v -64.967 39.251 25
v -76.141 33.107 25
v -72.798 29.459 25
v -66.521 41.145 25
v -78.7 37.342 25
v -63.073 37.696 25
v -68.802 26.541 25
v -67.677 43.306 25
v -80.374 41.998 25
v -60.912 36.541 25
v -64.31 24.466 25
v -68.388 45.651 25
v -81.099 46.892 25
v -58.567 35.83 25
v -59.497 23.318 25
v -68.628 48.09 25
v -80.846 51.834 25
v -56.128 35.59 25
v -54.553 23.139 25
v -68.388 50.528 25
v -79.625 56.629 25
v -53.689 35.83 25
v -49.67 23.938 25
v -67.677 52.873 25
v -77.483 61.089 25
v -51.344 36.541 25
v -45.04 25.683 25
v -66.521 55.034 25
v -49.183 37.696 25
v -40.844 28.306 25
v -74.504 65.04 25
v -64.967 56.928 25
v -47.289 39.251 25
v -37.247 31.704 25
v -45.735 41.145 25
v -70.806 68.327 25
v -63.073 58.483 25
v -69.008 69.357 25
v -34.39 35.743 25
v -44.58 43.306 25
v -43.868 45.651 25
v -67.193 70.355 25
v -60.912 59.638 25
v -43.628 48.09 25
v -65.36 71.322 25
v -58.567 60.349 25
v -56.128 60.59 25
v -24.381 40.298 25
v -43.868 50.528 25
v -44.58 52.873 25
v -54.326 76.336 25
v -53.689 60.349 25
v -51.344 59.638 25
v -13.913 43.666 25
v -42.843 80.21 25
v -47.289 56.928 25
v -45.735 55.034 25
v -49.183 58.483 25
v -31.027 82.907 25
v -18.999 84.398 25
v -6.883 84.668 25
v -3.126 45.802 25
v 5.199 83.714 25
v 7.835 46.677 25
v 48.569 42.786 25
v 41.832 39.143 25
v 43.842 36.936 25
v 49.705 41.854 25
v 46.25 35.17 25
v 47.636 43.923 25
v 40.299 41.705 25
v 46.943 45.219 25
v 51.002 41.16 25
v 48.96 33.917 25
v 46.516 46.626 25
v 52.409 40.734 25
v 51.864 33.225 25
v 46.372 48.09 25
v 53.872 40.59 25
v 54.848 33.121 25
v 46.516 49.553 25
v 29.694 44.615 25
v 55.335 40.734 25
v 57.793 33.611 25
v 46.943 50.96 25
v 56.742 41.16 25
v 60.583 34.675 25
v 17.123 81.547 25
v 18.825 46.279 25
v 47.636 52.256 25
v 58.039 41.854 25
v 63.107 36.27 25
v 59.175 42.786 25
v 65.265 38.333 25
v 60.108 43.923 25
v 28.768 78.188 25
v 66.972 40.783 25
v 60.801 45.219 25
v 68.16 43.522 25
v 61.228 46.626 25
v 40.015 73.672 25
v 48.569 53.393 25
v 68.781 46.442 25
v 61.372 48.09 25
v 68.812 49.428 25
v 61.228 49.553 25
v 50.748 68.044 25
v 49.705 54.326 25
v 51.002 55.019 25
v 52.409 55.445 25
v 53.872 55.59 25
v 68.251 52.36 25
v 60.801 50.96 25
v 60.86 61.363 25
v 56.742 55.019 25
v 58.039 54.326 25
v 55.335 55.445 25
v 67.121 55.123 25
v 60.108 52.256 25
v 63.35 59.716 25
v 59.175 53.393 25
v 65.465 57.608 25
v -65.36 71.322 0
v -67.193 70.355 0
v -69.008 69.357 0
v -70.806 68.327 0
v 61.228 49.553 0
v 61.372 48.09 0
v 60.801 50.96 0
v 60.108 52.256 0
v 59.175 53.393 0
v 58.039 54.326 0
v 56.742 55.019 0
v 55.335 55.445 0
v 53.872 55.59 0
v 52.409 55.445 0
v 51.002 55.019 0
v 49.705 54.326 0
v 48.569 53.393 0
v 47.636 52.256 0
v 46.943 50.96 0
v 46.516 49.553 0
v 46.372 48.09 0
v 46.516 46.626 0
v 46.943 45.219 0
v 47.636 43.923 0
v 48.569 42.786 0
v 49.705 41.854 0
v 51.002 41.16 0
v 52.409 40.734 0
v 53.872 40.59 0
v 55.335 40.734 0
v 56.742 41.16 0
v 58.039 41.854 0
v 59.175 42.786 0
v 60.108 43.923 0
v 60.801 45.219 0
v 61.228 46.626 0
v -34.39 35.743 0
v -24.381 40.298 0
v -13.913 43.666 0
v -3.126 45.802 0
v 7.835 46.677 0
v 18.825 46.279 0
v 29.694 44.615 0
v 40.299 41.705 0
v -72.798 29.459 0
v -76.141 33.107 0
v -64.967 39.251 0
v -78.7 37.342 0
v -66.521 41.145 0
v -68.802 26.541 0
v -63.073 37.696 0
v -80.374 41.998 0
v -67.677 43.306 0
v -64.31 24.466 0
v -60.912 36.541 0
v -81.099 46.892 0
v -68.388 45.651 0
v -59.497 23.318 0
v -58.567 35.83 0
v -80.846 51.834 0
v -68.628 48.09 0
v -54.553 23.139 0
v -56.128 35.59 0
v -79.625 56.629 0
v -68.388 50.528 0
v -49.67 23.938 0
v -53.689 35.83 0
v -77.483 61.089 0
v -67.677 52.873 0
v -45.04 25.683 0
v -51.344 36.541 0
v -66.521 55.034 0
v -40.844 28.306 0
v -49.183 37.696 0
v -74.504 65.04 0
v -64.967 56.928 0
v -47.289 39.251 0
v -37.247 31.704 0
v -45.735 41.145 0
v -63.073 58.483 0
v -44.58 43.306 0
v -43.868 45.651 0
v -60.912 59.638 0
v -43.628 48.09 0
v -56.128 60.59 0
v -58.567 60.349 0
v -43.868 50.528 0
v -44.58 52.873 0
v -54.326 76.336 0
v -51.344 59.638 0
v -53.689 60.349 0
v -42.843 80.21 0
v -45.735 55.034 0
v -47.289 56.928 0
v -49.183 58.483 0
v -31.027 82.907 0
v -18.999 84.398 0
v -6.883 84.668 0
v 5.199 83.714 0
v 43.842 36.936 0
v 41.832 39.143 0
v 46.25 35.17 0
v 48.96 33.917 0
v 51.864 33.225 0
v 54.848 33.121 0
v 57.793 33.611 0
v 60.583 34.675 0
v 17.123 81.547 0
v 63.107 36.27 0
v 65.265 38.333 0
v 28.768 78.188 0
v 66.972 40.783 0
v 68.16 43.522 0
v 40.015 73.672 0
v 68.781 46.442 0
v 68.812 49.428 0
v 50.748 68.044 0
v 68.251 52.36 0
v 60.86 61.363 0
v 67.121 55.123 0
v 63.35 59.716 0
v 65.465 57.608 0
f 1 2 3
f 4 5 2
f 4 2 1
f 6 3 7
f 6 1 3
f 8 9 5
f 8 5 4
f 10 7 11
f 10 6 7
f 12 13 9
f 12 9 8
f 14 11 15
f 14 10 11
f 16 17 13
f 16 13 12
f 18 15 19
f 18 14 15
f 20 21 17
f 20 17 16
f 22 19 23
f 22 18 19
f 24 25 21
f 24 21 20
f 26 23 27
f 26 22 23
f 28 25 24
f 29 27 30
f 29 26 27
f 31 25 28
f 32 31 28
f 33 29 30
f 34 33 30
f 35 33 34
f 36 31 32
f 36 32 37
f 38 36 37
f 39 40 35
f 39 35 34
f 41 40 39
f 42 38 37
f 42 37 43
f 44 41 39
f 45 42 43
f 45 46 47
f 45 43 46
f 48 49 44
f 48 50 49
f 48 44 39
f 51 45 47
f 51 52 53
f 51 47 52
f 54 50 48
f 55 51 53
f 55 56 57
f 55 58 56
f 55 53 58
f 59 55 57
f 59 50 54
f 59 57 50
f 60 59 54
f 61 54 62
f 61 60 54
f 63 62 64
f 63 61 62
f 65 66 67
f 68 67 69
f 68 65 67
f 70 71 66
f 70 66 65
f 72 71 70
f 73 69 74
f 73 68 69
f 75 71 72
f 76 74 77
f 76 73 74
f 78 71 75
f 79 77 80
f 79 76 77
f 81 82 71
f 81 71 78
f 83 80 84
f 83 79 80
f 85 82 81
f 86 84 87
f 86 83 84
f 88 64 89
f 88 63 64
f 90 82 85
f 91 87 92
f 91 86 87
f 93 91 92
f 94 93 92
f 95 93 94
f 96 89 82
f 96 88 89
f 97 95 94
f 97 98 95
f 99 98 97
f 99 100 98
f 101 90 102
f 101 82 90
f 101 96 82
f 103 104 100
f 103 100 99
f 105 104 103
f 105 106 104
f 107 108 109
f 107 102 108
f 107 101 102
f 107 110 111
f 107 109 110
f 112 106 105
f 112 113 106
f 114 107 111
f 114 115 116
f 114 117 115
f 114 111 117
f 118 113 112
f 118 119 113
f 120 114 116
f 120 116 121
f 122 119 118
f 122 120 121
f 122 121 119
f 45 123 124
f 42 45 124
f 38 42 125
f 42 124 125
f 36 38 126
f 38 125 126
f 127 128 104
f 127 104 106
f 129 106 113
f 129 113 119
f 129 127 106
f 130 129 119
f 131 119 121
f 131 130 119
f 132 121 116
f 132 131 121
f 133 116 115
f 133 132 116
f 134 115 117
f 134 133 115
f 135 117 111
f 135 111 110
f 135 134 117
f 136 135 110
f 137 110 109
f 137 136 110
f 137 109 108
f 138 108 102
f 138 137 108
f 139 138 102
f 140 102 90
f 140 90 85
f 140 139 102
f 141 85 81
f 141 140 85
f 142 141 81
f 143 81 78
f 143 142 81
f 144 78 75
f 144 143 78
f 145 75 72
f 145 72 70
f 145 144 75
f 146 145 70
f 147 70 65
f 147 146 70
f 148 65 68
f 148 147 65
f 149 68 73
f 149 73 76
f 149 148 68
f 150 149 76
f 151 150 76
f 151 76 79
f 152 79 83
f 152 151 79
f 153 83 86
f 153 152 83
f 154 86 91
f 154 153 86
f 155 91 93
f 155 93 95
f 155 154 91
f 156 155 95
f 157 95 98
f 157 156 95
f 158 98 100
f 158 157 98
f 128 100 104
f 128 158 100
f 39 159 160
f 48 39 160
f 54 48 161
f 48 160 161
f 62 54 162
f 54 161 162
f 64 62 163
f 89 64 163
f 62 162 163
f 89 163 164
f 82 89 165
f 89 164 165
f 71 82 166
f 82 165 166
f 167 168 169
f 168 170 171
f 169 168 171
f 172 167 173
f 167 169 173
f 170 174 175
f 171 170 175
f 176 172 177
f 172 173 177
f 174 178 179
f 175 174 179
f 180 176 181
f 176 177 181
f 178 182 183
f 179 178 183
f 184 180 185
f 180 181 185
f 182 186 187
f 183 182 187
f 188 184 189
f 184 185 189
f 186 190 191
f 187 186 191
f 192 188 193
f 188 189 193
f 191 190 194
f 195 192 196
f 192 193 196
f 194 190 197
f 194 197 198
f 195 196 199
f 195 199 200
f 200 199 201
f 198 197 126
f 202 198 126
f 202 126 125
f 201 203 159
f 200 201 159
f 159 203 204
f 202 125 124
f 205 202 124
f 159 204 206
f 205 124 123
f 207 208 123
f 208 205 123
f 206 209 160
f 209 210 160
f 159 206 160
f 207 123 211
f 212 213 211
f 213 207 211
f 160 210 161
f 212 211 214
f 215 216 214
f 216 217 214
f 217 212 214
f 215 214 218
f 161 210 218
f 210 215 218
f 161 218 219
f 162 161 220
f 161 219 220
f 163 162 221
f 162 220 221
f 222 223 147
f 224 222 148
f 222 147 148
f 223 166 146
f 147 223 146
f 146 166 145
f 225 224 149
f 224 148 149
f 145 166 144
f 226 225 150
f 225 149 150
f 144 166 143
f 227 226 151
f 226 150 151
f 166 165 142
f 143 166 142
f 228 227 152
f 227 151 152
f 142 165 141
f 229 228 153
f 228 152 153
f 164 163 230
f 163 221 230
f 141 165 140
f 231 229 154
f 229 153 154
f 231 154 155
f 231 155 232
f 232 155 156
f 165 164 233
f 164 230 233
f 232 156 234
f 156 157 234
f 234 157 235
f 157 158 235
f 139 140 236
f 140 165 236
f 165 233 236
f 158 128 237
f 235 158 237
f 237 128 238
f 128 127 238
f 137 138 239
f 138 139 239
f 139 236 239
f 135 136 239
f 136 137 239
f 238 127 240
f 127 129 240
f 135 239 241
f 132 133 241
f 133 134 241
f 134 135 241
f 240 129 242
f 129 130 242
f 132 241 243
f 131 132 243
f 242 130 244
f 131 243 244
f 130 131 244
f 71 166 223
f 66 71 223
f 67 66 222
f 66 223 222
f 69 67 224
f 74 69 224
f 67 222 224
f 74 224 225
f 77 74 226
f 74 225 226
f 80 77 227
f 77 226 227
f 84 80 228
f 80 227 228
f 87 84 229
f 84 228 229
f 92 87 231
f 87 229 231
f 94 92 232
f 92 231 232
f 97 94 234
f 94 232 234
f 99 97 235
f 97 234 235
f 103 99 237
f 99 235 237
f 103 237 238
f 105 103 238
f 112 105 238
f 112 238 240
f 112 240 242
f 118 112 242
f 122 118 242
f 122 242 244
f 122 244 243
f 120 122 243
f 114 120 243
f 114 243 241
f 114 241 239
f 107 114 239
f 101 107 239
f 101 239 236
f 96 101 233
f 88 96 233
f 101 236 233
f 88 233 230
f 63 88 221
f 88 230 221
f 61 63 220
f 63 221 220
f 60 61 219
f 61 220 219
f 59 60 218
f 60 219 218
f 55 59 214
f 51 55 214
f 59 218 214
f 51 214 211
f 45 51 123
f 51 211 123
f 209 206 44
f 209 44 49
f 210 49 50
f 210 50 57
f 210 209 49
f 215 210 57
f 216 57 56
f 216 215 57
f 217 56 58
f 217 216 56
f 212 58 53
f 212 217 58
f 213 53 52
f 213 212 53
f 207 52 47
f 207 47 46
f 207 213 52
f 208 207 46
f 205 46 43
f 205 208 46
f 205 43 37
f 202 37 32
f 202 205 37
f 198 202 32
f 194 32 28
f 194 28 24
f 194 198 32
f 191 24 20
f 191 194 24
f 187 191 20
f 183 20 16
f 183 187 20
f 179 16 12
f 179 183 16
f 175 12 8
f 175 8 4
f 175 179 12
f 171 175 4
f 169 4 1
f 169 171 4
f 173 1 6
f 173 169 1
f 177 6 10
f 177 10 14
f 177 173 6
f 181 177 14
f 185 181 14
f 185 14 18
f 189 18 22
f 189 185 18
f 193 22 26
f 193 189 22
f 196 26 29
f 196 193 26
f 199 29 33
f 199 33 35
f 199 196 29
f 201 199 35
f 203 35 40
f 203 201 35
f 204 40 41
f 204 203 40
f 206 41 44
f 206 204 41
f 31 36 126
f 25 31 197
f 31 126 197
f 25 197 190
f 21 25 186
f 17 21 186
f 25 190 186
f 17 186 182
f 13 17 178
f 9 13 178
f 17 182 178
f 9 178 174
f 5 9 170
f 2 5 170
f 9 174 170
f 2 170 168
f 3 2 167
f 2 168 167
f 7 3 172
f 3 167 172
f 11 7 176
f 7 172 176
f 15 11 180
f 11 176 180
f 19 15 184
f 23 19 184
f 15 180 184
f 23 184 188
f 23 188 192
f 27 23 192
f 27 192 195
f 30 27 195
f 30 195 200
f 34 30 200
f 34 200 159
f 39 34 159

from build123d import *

# Parameters (mm, degrees)
F0_R     = 12.5
F0_R_2   = 7.5
F1_DEPTH = 25


with BuildPart() as f1:
    # F0 (on Top) → F1 (new body)
    with BuildSketch(Plane.XY):
        with BuildLine():
            ThreePointArc((60.859742, 61.362541), (-0.829779, 84.343763), (-65.360229, 71.322454))
            ThreePointArc((-65.360229, 71.322454), (-68.102494, 69.860047), (-70.805967, 68.327115))
            ThreePointArc((-70.805967, 68.327115), (-72.798151, 29.458795), (-34.389511, 35.743021))
            ThreePointArc((-34.389511, 35.743021), (2.341937, 46.39821), (40.298576, 41.705039))
            ThreePointArc((40.298576, 41.705039), (64.237658, 37.247404), (60.859742, 61.362541))
        make_face()
        with Locations((-56.12801, 48.089586)):
            Circle(F0_R, mode=Mode.SUBTRACT)
        with Locations((53.87199, 48.089586)):
            Circle(F0_R_2, mode=Mode.SUBTRACT)
    extrude(amount=F1_DEPTH)


solid = f1.part
